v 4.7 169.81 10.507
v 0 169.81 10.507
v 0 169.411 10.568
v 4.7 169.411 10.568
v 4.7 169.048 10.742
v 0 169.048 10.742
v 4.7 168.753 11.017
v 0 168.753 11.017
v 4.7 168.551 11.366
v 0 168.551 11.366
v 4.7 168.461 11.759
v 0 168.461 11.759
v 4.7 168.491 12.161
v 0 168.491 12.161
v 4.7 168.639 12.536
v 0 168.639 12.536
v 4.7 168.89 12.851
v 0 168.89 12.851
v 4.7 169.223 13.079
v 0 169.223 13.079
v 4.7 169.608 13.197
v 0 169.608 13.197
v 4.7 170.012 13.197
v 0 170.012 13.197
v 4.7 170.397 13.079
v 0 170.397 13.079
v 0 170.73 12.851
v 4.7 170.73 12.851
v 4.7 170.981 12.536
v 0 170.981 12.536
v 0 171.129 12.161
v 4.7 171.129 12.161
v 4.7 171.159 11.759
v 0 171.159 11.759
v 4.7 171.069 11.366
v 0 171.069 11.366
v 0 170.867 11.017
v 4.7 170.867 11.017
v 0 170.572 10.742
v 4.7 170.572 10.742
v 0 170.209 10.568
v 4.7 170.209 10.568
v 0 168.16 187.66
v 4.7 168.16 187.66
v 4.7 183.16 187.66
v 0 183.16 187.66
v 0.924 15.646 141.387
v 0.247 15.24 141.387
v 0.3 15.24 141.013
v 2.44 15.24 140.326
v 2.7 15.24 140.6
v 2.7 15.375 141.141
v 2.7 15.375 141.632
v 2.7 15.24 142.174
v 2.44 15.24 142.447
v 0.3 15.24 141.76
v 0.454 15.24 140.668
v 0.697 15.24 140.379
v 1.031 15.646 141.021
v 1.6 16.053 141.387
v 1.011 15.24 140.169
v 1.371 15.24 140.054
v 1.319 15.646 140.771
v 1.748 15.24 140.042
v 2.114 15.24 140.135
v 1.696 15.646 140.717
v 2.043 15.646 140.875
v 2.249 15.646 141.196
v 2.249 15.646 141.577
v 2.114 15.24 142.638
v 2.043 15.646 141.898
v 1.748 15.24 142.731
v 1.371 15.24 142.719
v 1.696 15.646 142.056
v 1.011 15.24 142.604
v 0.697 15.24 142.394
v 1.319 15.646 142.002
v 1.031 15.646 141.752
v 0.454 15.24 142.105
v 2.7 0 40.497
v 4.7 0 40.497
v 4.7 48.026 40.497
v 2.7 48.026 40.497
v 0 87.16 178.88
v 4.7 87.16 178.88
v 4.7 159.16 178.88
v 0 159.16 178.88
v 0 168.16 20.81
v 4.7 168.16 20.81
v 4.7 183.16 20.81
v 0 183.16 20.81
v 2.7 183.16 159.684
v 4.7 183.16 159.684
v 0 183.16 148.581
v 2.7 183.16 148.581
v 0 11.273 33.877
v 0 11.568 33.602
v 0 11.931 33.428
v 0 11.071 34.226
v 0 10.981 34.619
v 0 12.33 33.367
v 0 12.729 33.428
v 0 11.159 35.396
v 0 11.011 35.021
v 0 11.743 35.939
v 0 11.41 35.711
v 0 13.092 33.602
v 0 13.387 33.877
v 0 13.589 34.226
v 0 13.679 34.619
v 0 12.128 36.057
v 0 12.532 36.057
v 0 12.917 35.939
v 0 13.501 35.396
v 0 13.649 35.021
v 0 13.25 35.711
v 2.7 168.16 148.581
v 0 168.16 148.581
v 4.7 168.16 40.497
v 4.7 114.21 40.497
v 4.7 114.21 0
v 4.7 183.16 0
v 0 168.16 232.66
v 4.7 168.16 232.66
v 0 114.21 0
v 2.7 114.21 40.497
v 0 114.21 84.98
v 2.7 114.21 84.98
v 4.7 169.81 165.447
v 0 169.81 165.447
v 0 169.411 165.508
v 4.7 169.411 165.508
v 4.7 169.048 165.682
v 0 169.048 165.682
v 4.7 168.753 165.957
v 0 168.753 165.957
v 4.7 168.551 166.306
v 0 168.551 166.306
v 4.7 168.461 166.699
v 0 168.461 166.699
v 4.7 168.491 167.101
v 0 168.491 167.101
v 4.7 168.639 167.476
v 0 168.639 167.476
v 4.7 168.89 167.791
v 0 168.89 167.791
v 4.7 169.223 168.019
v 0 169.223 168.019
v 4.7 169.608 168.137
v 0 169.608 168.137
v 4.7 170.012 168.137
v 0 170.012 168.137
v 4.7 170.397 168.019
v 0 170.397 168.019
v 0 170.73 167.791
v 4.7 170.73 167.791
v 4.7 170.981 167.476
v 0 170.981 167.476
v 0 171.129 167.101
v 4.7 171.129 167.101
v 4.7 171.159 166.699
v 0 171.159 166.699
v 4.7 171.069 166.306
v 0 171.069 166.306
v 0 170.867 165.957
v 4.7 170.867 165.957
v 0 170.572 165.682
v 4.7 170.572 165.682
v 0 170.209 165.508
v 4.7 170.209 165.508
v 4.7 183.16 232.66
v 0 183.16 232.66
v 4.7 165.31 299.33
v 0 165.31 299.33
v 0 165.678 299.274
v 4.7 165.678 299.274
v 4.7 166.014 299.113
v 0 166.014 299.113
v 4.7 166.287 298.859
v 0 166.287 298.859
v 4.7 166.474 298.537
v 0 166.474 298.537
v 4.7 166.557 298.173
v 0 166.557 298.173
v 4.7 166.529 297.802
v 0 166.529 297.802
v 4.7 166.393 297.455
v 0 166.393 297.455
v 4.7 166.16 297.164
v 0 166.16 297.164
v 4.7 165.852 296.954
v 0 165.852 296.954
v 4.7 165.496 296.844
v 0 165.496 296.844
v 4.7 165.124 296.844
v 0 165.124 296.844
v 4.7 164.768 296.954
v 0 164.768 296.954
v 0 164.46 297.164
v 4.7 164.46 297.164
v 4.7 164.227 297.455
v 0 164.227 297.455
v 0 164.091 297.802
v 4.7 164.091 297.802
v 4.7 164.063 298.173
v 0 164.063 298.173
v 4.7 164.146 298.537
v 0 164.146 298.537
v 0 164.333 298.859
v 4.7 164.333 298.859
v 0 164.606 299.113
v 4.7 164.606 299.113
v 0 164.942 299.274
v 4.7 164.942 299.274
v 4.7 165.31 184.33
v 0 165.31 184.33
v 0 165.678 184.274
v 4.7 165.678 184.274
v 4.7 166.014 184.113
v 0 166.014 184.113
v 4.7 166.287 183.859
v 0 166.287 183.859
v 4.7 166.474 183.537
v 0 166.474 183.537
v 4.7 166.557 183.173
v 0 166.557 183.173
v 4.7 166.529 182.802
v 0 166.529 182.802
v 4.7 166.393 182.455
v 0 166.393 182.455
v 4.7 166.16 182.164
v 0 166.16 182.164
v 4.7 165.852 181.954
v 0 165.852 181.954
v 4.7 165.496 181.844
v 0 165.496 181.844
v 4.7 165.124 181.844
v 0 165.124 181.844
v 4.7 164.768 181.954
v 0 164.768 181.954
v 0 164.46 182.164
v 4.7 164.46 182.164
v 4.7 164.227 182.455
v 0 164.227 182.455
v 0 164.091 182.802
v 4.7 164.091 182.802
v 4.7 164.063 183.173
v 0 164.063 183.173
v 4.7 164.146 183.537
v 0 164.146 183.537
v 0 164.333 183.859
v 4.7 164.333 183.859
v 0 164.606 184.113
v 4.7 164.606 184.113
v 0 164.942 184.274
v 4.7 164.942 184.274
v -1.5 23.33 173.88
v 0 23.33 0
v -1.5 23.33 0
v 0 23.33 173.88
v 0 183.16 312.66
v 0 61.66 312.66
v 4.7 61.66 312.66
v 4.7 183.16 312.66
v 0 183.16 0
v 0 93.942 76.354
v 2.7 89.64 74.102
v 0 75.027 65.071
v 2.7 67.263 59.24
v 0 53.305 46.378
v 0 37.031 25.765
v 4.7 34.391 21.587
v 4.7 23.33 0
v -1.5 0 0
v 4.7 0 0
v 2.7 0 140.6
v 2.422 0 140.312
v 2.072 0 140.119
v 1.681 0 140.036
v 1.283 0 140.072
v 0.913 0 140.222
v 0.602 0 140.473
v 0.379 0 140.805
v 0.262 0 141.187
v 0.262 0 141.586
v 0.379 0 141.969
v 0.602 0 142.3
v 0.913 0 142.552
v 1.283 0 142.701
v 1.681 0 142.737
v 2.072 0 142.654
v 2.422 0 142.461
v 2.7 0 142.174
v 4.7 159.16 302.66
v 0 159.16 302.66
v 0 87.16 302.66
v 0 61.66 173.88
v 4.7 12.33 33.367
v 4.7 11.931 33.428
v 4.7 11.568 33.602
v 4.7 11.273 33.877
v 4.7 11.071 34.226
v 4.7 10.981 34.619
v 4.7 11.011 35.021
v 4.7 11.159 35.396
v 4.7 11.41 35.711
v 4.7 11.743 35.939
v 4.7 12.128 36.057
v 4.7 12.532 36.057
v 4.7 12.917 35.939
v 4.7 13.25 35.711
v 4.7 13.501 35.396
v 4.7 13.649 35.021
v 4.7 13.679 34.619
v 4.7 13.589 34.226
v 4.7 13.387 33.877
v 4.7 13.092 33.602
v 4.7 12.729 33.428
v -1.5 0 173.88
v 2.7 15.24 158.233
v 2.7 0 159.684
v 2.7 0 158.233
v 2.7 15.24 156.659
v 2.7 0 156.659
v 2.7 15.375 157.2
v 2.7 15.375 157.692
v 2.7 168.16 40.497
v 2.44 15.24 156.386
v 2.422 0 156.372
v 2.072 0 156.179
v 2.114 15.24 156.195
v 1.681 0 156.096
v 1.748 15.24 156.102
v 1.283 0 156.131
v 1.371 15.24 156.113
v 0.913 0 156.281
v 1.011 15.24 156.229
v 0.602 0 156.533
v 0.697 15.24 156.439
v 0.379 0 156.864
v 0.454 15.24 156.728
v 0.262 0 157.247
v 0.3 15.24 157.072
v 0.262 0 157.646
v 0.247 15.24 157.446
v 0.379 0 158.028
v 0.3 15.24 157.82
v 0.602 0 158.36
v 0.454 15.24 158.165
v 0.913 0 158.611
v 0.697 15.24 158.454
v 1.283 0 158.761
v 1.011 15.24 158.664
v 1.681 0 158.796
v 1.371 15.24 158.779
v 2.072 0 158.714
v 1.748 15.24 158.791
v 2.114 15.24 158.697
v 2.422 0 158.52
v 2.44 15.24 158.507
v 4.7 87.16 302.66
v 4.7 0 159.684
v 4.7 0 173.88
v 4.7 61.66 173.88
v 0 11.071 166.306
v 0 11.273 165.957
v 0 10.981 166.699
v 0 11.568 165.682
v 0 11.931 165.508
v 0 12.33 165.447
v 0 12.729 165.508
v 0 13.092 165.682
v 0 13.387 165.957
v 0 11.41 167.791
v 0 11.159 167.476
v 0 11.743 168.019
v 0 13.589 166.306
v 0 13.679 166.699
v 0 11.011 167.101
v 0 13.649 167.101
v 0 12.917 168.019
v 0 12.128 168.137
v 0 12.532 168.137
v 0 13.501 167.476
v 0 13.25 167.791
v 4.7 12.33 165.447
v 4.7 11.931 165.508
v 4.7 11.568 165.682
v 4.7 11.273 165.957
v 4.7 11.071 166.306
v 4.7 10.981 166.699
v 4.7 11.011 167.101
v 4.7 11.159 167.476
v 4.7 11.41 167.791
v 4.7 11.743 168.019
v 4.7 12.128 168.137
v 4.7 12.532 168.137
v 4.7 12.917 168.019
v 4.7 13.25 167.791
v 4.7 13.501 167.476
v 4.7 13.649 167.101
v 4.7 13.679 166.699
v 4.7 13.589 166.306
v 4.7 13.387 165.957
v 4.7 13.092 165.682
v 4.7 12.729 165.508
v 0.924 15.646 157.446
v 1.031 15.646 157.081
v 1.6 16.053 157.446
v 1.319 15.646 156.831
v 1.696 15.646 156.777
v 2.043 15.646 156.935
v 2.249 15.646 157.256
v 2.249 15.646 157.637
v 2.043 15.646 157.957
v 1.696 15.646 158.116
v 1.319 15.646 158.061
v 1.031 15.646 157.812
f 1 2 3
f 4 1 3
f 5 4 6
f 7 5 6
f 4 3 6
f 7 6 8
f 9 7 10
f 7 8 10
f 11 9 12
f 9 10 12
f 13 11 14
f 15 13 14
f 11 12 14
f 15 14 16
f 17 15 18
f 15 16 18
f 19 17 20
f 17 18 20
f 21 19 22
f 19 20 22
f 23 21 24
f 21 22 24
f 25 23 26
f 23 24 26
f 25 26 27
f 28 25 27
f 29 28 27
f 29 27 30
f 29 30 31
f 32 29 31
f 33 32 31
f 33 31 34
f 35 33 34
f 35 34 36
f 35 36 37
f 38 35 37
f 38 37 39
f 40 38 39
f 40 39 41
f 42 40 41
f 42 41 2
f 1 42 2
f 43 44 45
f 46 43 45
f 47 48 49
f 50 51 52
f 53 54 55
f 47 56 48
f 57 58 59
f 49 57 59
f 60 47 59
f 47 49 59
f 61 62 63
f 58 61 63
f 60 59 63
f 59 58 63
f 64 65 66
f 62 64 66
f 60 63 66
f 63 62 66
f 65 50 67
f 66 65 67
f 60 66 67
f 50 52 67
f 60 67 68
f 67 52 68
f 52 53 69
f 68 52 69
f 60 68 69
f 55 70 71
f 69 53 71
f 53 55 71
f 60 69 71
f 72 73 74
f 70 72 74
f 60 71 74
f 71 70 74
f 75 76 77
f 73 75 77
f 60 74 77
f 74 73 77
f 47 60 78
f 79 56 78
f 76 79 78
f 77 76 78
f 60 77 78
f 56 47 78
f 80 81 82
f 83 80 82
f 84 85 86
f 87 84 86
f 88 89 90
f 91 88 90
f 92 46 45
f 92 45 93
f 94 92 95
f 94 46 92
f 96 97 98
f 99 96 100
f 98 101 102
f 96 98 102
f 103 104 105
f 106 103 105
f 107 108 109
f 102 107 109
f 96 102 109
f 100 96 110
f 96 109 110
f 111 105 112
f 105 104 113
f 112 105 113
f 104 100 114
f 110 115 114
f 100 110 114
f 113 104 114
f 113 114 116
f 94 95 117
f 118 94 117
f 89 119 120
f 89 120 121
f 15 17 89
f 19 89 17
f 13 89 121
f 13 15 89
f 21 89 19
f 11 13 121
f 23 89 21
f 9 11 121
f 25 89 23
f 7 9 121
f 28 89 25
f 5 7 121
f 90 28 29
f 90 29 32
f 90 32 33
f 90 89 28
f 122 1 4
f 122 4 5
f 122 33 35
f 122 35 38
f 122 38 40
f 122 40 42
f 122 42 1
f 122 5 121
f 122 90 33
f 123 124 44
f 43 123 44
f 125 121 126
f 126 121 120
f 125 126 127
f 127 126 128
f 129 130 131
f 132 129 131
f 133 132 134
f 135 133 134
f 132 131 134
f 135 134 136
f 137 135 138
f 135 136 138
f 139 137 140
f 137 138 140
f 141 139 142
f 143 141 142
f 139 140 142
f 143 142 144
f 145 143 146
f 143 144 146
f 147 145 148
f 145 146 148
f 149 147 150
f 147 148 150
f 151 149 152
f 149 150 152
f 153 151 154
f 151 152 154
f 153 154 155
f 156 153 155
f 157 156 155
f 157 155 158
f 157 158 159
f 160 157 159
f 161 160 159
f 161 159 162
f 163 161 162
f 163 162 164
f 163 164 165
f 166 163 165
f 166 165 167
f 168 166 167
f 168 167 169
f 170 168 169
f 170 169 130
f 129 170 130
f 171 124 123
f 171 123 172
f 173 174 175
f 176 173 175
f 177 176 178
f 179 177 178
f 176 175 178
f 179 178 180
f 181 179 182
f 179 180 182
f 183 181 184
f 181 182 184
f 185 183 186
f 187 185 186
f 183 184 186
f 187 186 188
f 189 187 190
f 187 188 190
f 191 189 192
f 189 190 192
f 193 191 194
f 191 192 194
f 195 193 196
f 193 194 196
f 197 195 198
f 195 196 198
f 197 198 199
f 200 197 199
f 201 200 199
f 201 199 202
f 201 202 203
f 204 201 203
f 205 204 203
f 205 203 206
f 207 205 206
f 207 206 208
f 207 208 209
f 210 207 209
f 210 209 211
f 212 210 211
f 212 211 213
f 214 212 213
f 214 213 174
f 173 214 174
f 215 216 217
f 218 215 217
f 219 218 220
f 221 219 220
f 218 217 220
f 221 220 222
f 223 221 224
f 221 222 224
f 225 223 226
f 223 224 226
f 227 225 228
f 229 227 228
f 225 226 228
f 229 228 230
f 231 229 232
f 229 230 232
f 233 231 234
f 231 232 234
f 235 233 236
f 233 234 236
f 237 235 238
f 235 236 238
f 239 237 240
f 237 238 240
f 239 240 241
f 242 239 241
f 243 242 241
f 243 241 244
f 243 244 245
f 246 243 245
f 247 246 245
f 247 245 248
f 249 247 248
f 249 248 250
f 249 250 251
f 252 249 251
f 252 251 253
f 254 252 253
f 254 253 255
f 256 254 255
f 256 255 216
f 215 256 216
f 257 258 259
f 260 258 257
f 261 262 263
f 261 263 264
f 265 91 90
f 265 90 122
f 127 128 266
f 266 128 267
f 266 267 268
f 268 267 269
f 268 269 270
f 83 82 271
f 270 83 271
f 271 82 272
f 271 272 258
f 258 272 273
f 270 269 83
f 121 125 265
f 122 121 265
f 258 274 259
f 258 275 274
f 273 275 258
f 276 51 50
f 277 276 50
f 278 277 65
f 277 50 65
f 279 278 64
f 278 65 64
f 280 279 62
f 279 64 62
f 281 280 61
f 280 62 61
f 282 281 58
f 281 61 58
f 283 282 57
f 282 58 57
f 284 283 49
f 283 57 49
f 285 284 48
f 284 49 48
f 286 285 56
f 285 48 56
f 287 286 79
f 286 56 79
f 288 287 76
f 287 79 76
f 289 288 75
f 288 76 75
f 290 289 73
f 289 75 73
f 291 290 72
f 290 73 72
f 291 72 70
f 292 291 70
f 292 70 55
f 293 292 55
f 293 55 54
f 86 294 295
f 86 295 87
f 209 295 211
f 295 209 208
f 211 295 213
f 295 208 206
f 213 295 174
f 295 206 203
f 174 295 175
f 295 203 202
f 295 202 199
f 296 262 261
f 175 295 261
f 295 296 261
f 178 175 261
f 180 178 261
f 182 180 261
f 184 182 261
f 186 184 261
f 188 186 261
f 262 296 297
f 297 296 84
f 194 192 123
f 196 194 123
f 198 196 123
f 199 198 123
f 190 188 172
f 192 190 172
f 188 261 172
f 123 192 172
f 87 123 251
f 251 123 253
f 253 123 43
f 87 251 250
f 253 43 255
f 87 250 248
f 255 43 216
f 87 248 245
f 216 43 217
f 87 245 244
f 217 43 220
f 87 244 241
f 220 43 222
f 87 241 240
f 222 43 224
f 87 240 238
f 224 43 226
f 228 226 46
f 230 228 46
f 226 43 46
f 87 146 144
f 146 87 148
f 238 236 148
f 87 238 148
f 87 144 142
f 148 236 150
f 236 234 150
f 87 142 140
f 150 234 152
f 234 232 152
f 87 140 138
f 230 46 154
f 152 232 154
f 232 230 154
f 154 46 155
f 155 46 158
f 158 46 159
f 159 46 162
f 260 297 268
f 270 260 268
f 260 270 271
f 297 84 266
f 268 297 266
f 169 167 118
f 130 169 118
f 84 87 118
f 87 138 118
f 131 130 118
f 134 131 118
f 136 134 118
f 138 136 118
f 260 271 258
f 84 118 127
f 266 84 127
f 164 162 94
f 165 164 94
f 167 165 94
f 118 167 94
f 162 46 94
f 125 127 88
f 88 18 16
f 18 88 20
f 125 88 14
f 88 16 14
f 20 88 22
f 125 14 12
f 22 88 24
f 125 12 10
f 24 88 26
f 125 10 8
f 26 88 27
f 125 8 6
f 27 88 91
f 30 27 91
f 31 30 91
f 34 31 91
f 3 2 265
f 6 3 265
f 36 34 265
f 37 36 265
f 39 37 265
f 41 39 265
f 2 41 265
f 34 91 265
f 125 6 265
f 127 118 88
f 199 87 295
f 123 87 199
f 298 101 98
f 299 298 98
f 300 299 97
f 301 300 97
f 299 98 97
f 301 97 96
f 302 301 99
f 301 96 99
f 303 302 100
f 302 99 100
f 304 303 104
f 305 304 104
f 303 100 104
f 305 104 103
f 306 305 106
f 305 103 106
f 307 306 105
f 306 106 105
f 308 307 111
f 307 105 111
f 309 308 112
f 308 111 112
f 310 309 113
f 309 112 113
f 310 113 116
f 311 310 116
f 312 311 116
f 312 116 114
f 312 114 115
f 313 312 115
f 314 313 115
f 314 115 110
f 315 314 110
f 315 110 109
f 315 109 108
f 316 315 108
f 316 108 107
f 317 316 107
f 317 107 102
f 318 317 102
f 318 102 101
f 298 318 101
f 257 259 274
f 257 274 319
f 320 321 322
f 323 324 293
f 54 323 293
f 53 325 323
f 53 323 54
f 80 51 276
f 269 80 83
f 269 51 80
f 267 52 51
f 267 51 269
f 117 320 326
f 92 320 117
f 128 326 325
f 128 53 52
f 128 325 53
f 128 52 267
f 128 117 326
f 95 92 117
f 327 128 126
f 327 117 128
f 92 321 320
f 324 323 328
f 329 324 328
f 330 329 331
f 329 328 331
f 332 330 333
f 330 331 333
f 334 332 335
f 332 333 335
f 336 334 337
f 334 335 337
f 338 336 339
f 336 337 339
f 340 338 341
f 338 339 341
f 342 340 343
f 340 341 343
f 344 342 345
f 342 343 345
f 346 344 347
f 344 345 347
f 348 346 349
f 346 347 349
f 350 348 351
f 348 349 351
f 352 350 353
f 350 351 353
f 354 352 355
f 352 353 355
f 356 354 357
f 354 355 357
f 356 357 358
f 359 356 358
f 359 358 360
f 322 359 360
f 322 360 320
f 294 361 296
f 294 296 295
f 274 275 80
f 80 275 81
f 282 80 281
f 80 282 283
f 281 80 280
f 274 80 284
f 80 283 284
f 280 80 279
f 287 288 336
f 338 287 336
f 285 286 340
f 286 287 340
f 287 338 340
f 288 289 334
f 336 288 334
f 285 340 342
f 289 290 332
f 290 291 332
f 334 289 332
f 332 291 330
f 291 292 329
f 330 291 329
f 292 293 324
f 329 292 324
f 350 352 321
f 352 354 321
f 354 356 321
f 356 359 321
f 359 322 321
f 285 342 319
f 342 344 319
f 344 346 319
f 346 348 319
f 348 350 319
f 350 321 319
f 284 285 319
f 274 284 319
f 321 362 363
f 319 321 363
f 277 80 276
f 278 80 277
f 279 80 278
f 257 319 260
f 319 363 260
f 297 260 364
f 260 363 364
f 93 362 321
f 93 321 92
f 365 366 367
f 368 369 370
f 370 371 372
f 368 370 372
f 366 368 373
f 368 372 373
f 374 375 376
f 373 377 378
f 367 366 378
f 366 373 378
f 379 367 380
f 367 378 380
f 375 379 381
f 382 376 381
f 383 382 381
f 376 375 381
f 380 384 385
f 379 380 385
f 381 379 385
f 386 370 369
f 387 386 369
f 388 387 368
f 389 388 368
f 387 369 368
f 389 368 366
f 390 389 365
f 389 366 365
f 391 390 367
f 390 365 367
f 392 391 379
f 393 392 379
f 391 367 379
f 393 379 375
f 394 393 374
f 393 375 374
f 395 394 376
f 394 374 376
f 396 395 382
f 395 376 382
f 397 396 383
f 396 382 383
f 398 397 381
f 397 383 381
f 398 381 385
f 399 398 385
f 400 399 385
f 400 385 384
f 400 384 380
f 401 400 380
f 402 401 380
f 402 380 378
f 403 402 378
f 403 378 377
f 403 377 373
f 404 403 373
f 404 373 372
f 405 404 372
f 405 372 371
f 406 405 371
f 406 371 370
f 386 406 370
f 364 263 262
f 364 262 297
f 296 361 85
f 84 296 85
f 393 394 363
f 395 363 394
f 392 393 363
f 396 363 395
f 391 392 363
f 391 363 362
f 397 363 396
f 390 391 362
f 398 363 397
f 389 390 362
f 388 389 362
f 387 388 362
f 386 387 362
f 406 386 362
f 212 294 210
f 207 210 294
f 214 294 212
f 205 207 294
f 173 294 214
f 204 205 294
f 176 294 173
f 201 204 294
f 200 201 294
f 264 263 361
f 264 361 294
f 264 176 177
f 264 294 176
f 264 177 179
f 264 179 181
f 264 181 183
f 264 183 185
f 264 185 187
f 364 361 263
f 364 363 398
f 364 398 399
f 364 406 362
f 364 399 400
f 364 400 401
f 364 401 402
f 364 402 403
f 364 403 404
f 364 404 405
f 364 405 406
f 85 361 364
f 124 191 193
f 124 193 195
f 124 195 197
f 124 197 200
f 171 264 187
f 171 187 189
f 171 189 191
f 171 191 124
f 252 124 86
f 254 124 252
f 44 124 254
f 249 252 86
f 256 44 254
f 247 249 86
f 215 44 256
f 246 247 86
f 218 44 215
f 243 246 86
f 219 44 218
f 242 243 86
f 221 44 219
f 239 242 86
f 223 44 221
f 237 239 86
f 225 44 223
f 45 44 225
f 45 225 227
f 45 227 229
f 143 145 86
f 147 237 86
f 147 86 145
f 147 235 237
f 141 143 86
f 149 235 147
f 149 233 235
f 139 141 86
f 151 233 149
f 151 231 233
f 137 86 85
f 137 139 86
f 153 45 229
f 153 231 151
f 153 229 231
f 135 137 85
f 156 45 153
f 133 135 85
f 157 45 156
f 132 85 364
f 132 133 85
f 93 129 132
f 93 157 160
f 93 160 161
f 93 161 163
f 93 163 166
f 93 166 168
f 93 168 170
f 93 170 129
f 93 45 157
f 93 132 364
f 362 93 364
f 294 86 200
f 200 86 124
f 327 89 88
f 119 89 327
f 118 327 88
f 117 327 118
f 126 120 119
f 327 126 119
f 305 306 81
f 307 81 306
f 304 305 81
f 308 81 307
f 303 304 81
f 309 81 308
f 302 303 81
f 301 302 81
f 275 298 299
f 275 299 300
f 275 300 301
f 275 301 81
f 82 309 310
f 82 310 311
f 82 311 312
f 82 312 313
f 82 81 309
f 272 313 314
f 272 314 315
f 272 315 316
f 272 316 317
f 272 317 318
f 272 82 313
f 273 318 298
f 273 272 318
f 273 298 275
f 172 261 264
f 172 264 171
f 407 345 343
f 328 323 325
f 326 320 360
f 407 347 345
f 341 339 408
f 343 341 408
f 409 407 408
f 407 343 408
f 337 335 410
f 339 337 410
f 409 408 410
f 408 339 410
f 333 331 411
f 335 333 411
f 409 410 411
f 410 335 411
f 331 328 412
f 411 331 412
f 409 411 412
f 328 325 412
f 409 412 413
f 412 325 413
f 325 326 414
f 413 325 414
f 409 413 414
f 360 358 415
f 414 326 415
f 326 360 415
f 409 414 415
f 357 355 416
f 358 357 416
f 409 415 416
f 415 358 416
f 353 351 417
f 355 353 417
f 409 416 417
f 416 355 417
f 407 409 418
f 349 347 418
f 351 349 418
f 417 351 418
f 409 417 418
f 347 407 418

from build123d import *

# Parameters (mm, degrees)
SKETCH1_W                     = 312.66
SKETCH1_H                     = 183.16
BODY_DEPTH                    = 4.7
F_6_32_TAPPED_HOLE1_D         = 2.7051
RISER_CABLE_CUTOUT_REACH      = 364.389
EXPANSION_CUTOUT_REACH        = 364.389
SKETCH11_W                    = 138.78
SKETCH11_H                    = 61.66
PSU_CABLE_CUTOUT_REACH        = 364.389
SKETCH20_W                    = 45
SKETCH20_H                    = 15
SSD_ACCESS_CUTOUT_REACH       = 364.389
SKETCH22_W                    = 123.78
SKETCH22_H                    = 72
TAP_DRILL_FOR_M3X0_5_TAP1_D   = 2.5
HOLE_IN_STOCK_REACH           = 364.389
SKETCH33_W                    = 173.88
SKETCH33_H                    = 23.33
BOSS_EXTRUDE1_DEPTH           = 1.5
TAP_DRILL_FOR_6_32_TAP1_D     = 2.7051
TAP_DRILL_FOR_6_32_TAP1_DEPTH = 15.24
TAP_DRILL_FOR_6_32_TAP1_TIP   = 0.81269403
SKETCH32_W                    = 119.186565276
SKETCH32_H                    = 183.16
CUT_EXTRUDE1_DEPTH            = 2


with BuildPart() as part:
    # Sketch1 → body (new body)
    with BuildSketch(Plane(origin=(0, 0, 0), x_dir=(0, 0, -1), z_dir=(1, 0, 0))):
        with Locations((-156.33, 91.58)):
            Rectangle(SKETCH1_W, SKETCH1_H)
    extrude(amount=BODY_DEPTH)

    # #6-32 Tapped Hole1 (through all)
    with Locations(Plane(origin=(4.7, 169.81, 166.8), x_dir=(0, 0, 1), z_dir=(1, 0, 0))):
        with Locations((0, 0), (-154.94, 0), (-132.08, 157.48), (0, 157.48)):
            Hole(F_6_32_TAPPED_HOLE1_D / 2)

    # Sketch8 → riser-cable-cutout (cut, up to next)
    with BuildSketch(Plane(origin=(4.7, 0, 0), x_dir=(0, 0, -1), z_dir=(1, 0, 0)), mode=Mode.PRIVATE) as riser_cable_cutout_sk1:
        Polygon((-148.58070669, 183.16), (-20.810027071, 183.16), (-20.810027071, 176.16), (-20.810027071, 168.16), (-148.58070669, 168.16), (-148.58070669, 176.16), align=None)
    riser_cable_cutout_tool1 = extrude(riser_cable_cutout_sk1.sketch, amount=-RISER_CABLE_CUTOUT_REACH, mode=Mode.PRIVATE) & part.part
    add(riser_cable_cutout_tool1.solids().sort_by_distance((4.7, 175.66, 84.695367))[0], mode=Mode.SUBTRACT)

    # Sketch11 → expansion-cutout (cut, up to next)
    with BuildSketch(Plane(origin=(4.7, 0, 0), x_dir=(0, 0, -1), z_dir=(1, 0, 0)), mode=Mode.PRIVATE) as expansion_cutout_sk1:
        with Locations((-243.27, 30.83)):
            Rectangle(SKETCH11_W, SKETCH11_H)
    expansion_cutout_tool1 = extrude(expansion_cutout_sk1.sketch, amount=-EXPANSION_CUTOUT_REACH, mode=Mode.PRIVATE) & part.part
    add(expansion_cutout_tool1.solids().sort_by_distance((4.7, 30.83, 243.27))[0], mode=Mode.SUBTRACT)

    # Sketch20 → psu-cable-cutout (cut, up to next)
    with BuildSketch(Plane(origin=(4.7, 0, 0), x_dir=(0, 0, -1), z_dir=(1, 0, 0)), mode=Mode.PRIVATE) as psu_cable_cutout_sk1:
        with Locations((-210.16, 175.66)):
            Rectangle(SKETCH20_W, SKETCH20_H)
    psu_cable_cutout_tool1 = extrude(psu_cable_cutout_sk1.sketch, amount=-PSU_CABLE_CUTOUT_REACH, mode=Mode.PRIVATE) & part.part
    add(psu_cable_cutout_tool1.solids().sort_by_distance((4.7, 175.66, 210.16))[0], mode=Mode.SUBTRACT)

    # Sketch22 → ssd-access-cutout (cut, up to next)
    with BuildSketch(Plane(origin=(4.7, 0, 0), x_dir=(0, 0, -1), z_dir=(1, 0, 0)), mode=Mode.PRIVATE) as ssd_access_cutout_sk1:
        with Locations((-240.77, 123.16)):
            Rectangle(SKETCH22_W, SKETCH22_H)
    ssd_access_cutout_tool1 = extrude(ssd_access_cutout_sk1.sketch, amount=-SSD_ACCESS_CUTOUT_REACH, mode=Mode.PRIVATE) & part.part
    add(ssd_access_cutout_tool1.solids().sort_by_distance((4.7, 123.16, 240.77))[0], mode=Mode.SUBTRACT)

    # Tap Drill for M3x0.5 Tap1 (through all)
    with Locations(Plane(origin=(4.7, 0, 0), x_dir=(0, 0, -1), z_dir=(1, 0, 0))):
        with Locations((-298.08, 165.31), (-183.08, 165.31)):
            Hole(TAP_DRILL_FOR_M3X0_5_TAP1_D / 2)

    # Sketch27 → hole-in-stock (cut, up to next)
    with BuildSketch(Plane(origin=(4.7, 0, 0), x_dir=(0, 0, -1), z_dir=(1, 0, 0)), mode=Mode.PRIVATE) as hole_in_stock_sk1:
        with BuildLine():
            Line((0, 114.21), (-84.98, 114.21))
            add(Edge.make_bspline(
                [(-84.98, 114.21), (-62.176533149, 49.839292815), (0, 23.33)],
                knots=[0, 0, 0, 1, 1, 1], degree=2))
            Line((0, 23.33), (0, 114.21))
        make_face()
    hole_in_stock_tool1 = extrude(hole_in_stock_sk1.sketch, amount=-HOLE_IN_STOCK_REACH, mode=Mode.PRIVATE) & part.part
    add(hole_in_stock_tool1.solids().sort_by_distance((4.7, 79.62289, 32.431716))[0], mode=Mode.SUBTRACT)

    # Sketch33 → Boss-Extrude1 (add)
    with BuildSketch(Plane.ZY):
        with Locations((86.94, 11.665)):
            Rectangle(SKETCH33_W, SKETCH33_H)
    extrude(amount=BOSS_EXTRUDE1_DEPTH)

    # Tap Drill for #6-32 Tap1
    with Locations(Plane(origin=(0, 0, 0), x_dir=(-1, 0, 0), z_dir=(0, -1, 0))):
        with Locations((-1.6, -157.446313124), (-1.6, -141.386526913)):
            Hole(TAP_DRILL_FOR_6_32_TAP1_D / 2, depth=TAP_DRILL_FOR_6_32_TAP1_DEPTH)
            with Locations((0, 0, -(TAP_DRILL_FOR_6_32_TAP1_DEPTH + TAP_DRILL_FOR_6_32_TAP1_TIP / 2))):  # 118° drill point
                Cone(0, TAP_DRILL_FOR_6_32_TAP1_D / 2, TAP_DRILL_FOR_6_32_TAP1_TIP, mode=Mode.SUBTRACT)

    # Sketch32 → Cut-Extrude1 (cut)
    with BuildSketch(Plane(origin=(4.7, 0, 0), x_dir=(0, 0, -1), z_dir=(1, 0, 0))):
        with Locations((-100.09076437, 91.58)):
            Rectangle(SKETCH32_W, SKETCH32_H)
    extrude(amount=-CUT_EXTRUDE1_DEPTH, mode=Mode.SUBTRACT)


solid = part.part
